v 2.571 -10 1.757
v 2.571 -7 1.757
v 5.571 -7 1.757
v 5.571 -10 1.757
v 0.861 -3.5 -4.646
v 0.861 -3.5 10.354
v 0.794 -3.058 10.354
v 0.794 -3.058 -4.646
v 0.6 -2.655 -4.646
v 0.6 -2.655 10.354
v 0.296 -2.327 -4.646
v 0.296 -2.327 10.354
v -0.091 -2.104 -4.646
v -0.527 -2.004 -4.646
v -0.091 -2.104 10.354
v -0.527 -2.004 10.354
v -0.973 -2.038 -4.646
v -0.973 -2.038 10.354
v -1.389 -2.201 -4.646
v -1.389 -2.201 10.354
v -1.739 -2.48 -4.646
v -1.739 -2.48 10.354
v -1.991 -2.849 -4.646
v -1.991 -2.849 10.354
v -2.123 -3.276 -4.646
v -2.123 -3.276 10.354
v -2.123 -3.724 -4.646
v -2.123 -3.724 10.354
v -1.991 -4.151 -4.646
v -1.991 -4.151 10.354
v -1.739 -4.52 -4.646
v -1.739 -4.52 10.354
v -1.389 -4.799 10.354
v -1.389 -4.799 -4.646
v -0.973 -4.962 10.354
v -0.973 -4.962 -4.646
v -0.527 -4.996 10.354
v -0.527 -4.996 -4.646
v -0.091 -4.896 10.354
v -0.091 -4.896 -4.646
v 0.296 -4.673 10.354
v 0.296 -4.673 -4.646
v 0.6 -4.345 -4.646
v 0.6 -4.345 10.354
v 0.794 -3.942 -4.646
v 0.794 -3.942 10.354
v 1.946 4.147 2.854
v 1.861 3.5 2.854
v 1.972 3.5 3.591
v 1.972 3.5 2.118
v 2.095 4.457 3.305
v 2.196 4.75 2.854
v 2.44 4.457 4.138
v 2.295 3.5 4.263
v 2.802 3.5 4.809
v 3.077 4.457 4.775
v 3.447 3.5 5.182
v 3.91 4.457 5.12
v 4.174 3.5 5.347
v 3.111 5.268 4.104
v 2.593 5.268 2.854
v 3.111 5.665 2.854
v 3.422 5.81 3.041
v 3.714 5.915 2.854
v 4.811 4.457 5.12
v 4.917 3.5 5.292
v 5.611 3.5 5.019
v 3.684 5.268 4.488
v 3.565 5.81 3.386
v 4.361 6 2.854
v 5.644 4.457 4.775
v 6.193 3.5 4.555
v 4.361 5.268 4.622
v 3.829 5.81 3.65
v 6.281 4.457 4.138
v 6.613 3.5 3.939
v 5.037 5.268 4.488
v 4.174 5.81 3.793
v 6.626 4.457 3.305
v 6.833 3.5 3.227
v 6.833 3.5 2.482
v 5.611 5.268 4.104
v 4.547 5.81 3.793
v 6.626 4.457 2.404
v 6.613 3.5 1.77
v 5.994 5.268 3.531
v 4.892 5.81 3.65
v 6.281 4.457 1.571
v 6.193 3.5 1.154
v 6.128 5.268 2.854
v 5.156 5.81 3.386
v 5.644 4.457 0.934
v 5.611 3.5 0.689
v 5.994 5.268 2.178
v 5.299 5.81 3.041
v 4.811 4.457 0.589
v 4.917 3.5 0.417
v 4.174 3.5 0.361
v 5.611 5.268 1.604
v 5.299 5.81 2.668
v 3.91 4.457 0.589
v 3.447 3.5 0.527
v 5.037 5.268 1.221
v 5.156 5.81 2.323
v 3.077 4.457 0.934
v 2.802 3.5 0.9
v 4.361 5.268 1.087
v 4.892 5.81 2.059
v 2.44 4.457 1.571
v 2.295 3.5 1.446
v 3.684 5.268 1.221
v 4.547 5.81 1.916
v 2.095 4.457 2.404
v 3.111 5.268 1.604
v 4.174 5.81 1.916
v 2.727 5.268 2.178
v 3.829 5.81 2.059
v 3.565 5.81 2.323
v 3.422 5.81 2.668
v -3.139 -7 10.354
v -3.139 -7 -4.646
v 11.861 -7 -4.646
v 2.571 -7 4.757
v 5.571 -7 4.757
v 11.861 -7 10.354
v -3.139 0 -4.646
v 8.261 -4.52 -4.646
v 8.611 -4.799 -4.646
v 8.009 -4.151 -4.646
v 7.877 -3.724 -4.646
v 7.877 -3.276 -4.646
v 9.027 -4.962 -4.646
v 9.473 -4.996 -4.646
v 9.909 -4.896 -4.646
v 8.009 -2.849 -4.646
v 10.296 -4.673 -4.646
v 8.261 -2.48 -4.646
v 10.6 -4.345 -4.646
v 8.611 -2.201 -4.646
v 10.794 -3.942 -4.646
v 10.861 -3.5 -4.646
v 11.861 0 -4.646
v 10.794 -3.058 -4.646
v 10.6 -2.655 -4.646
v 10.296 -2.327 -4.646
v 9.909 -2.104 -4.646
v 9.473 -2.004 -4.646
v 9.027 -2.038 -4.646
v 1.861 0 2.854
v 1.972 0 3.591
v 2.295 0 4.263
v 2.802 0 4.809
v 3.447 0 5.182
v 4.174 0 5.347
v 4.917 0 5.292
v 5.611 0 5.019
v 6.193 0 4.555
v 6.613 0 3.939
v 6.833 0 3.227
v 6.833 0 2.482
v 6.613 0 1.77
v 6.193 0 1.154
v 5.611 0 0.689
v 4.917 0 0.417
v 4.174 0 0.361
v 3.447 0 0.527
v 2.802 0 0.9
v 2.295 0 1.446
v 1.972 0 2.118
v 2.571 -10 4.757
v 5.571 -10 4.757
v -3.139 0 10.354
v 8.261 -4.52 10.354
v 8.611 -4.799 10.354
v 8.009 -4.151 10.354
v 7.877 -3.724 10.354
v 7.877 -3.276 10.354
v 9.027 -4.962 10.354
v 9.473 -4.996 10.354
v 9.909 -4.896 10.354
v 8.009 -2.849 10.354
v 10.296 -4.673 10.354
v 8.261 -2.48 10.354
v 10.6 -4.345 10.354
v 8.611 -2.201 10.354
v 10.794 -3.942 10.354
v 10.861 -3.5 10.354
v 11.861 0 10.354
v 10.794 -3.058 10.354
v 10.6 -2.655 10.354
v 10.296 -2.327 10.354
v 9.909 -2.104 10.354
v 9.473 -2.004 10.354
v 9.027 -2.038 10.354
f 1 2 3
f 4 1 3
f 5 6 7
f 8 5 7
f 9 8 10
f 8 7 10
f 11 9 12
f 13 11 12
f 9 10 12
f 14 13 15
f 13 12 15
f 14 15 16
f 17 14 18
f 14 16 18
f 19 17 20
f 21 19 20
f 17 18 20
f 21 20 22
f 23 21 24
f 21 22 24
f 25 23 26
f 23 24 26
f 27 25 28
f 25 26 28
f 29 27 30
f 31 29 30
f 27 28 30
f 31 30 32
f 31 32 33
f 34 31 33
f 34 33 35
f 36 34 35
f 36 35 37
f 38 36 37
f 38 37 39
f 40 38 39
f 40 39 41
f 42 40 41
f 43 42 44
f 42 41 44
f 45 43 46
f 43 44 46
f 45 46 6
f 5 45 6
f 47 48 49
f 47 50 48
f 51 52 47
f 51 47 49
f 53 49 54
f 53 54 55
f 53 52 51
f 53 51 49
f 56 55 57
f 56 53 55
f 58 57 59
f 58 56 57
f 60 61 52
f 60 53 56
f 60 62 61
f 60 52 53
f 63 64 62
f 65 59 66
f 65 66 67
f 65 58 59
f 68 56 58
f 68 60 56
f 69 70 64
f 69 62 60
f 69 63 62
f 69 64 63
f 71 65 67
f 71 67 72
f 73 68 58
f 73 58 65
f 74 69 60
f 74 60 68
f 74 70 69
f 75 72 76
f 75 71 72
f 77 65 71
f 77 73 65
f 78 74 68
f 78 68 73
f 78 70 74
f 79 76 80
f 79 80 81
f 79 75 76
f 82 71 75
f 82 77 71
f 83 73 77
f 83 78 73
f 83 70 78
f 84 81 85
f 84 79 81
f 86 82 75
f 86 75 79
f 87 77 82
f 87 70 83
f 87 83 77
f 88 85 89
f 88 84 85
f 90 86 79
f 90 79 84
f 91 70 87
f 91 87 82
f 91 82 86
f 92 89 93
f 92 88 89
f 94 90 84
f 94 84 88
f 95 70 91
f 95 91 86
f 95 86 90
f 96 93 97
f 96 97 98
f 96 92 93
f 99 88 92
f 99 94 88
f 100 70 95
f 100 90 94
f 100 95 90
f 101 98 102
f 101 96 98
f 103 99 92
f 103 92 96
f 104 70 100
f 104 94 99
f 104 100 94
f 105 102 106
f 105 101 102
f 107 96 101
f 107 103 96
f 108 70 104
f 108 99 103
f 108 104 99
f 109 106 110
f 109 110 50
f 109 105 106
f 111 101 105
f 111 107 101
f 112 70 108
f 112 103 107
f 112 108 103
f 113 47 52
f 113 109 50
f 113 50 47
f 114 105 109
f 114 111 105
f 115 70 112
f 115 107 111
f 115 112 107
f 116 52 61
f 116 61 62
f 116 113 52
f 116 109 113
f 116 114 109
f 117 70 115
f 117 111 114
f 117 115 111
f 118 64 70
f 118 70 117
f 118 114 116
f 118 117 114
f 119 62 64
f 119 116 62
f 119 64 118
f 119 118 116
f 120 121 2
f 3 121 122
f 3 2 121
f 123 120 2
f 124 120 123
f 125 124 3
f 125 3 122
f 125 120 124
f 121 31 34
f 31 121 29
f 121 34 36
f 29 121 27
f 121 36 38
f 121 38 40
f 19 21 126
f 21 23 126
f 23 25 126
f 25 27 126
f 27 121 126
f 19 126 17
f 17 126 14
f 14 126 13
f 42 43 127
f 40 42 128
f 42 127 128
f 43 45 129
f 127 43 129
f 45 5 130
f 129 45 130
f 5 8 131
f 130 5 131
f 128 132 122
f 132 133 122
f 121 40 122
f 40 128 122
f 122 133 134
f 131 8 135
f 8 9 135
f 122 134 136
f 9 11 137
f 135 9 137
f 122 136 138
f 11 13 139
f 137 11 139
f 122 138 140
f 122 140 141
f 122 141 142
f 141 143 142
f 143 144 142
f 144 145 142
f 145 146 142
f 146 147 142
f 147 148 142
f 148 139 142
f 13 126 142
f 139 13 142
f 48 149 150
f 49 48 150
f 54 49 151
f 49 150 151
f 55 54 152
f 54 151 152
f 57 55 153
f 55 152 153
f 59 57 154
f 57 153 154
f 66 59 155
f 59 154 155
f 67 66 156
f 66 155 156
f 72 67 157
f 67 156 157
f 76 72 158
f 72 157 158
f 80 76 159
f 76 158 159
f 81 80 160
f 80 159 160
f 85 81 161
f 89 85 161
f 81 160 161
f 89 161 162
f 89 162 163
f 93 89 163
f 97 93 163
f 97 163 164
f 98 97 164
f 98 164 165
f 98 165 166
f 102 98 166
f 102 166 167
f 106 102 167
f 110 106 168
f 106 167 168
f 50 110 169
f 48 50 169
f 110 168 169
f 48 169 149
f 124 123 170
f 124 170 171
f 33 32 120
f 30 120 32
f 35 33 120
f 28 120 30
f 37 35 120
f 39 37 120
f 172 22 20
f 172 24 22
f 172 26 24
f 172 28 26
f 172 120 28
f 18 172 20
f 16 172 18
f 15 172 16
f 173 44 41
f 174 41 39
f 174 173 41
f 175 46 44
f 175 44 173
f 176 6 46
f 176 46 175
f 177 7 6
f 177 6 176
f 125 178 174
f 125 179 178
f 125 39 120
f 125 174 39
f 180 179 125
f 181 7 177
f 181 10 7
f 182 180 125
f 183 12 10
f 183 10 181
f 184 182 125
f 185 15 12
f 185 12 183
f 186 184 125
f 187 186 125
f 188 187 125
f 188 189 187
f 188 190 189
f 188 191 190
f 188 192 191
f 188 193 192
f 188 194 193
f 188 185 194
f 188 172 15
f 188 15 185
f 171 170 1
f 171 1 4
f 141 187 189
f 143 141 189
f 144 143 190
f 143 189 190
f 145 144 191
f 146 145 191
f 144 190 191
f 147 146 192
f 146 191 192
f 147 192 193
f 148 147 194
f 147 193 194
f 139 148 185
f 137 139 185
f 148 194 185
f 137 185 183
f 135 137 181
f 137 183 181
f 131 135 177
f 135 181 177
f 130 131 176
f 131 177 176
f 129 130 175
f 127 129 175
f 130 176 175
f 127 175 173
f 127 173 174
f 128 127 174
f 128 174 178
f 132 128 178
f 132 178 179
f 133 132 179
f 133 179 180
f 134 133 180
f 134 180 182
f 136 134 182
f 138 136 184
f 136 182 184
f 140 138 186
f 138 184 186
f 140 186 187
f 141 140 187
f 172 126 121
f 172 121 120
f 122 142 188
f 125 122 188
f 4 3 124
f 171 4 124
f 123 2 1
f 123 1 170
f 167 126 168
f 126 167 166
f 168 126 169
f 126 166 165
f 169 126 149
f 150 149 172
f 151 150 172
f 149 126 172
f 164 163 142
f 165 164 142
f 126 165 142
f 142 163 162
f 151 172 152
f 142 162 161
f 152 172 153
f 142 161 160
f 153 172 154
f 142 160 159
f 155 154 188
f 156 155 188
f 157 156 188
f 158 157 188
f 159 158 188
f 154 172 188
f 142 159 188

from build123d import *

# Parameters (mm, degrees)
F0_W     = 15
F0_H     = 15
F1_DEPTH = 7
F2_R     = 1.5
F3_DEPTH = 15
F4_R     = 1.5
F5_DEPTH = 15
F6_W     = 3
F6_H     = 3
F7_DEPTH = 3
F8_R     = 2.5
F9_DEPTH = 6
F10_R    = 2.5


with BuildPart() as f1:
    # F0 (on Front) → F1 (new body)
    with BuildSketch(Plane.XZ):
        with Locations((4.360599, 2.854392)):
            Rectangle(F0_W, F0_H)
    extrude(amount=F1_DEPTH)

    # F2 (on face) → F3 (cut)
    with BuildSketch(Plane.XY.offset(10.354392)):
        with Locations((-0.639401, -3.5)):
            Circle(F2_R)
    extrude(amount=-F3_DEPTH, mode=Mode.SUBTRACT)

    # F4 (on face) → F5 (cut)
    with BuildSketch(Plane.XY.offset(10.354392)):
        with Locations((9.360599, -3.5)):
            Circle(F4_R)
    extrude(amount=-F5_DEPTH, mode=Mode.SUBTRACT)

    # F6 (on face) → F7 (join)
    with BuildSketch(Plane.XZ.offset(7)):
        with Locations((4.070706, 3.2569)):
            Rectangle(F6_W, F6_H)
    extrude(amount=F7_DEPTH)

    # F8 (on face) → F9 (join)
    with BuildSketch(Plane(origin=(0, 0, 0), x_dir=(-1, 0, 0), z_dir=(0, 1, 0))):
        with Locations((-4.360599, 2.854392)):
            Circle(F8_R)
    extrude(amount=F9_DEPTH)

    # F10
    f10_edges = [f1.edges().sort_by_distance(p)[0] for p in [
        (6.860599, 6, 2.854392),
    ]]
    fillet(f10_edges, radius=F10_R)


solid = f1.part
